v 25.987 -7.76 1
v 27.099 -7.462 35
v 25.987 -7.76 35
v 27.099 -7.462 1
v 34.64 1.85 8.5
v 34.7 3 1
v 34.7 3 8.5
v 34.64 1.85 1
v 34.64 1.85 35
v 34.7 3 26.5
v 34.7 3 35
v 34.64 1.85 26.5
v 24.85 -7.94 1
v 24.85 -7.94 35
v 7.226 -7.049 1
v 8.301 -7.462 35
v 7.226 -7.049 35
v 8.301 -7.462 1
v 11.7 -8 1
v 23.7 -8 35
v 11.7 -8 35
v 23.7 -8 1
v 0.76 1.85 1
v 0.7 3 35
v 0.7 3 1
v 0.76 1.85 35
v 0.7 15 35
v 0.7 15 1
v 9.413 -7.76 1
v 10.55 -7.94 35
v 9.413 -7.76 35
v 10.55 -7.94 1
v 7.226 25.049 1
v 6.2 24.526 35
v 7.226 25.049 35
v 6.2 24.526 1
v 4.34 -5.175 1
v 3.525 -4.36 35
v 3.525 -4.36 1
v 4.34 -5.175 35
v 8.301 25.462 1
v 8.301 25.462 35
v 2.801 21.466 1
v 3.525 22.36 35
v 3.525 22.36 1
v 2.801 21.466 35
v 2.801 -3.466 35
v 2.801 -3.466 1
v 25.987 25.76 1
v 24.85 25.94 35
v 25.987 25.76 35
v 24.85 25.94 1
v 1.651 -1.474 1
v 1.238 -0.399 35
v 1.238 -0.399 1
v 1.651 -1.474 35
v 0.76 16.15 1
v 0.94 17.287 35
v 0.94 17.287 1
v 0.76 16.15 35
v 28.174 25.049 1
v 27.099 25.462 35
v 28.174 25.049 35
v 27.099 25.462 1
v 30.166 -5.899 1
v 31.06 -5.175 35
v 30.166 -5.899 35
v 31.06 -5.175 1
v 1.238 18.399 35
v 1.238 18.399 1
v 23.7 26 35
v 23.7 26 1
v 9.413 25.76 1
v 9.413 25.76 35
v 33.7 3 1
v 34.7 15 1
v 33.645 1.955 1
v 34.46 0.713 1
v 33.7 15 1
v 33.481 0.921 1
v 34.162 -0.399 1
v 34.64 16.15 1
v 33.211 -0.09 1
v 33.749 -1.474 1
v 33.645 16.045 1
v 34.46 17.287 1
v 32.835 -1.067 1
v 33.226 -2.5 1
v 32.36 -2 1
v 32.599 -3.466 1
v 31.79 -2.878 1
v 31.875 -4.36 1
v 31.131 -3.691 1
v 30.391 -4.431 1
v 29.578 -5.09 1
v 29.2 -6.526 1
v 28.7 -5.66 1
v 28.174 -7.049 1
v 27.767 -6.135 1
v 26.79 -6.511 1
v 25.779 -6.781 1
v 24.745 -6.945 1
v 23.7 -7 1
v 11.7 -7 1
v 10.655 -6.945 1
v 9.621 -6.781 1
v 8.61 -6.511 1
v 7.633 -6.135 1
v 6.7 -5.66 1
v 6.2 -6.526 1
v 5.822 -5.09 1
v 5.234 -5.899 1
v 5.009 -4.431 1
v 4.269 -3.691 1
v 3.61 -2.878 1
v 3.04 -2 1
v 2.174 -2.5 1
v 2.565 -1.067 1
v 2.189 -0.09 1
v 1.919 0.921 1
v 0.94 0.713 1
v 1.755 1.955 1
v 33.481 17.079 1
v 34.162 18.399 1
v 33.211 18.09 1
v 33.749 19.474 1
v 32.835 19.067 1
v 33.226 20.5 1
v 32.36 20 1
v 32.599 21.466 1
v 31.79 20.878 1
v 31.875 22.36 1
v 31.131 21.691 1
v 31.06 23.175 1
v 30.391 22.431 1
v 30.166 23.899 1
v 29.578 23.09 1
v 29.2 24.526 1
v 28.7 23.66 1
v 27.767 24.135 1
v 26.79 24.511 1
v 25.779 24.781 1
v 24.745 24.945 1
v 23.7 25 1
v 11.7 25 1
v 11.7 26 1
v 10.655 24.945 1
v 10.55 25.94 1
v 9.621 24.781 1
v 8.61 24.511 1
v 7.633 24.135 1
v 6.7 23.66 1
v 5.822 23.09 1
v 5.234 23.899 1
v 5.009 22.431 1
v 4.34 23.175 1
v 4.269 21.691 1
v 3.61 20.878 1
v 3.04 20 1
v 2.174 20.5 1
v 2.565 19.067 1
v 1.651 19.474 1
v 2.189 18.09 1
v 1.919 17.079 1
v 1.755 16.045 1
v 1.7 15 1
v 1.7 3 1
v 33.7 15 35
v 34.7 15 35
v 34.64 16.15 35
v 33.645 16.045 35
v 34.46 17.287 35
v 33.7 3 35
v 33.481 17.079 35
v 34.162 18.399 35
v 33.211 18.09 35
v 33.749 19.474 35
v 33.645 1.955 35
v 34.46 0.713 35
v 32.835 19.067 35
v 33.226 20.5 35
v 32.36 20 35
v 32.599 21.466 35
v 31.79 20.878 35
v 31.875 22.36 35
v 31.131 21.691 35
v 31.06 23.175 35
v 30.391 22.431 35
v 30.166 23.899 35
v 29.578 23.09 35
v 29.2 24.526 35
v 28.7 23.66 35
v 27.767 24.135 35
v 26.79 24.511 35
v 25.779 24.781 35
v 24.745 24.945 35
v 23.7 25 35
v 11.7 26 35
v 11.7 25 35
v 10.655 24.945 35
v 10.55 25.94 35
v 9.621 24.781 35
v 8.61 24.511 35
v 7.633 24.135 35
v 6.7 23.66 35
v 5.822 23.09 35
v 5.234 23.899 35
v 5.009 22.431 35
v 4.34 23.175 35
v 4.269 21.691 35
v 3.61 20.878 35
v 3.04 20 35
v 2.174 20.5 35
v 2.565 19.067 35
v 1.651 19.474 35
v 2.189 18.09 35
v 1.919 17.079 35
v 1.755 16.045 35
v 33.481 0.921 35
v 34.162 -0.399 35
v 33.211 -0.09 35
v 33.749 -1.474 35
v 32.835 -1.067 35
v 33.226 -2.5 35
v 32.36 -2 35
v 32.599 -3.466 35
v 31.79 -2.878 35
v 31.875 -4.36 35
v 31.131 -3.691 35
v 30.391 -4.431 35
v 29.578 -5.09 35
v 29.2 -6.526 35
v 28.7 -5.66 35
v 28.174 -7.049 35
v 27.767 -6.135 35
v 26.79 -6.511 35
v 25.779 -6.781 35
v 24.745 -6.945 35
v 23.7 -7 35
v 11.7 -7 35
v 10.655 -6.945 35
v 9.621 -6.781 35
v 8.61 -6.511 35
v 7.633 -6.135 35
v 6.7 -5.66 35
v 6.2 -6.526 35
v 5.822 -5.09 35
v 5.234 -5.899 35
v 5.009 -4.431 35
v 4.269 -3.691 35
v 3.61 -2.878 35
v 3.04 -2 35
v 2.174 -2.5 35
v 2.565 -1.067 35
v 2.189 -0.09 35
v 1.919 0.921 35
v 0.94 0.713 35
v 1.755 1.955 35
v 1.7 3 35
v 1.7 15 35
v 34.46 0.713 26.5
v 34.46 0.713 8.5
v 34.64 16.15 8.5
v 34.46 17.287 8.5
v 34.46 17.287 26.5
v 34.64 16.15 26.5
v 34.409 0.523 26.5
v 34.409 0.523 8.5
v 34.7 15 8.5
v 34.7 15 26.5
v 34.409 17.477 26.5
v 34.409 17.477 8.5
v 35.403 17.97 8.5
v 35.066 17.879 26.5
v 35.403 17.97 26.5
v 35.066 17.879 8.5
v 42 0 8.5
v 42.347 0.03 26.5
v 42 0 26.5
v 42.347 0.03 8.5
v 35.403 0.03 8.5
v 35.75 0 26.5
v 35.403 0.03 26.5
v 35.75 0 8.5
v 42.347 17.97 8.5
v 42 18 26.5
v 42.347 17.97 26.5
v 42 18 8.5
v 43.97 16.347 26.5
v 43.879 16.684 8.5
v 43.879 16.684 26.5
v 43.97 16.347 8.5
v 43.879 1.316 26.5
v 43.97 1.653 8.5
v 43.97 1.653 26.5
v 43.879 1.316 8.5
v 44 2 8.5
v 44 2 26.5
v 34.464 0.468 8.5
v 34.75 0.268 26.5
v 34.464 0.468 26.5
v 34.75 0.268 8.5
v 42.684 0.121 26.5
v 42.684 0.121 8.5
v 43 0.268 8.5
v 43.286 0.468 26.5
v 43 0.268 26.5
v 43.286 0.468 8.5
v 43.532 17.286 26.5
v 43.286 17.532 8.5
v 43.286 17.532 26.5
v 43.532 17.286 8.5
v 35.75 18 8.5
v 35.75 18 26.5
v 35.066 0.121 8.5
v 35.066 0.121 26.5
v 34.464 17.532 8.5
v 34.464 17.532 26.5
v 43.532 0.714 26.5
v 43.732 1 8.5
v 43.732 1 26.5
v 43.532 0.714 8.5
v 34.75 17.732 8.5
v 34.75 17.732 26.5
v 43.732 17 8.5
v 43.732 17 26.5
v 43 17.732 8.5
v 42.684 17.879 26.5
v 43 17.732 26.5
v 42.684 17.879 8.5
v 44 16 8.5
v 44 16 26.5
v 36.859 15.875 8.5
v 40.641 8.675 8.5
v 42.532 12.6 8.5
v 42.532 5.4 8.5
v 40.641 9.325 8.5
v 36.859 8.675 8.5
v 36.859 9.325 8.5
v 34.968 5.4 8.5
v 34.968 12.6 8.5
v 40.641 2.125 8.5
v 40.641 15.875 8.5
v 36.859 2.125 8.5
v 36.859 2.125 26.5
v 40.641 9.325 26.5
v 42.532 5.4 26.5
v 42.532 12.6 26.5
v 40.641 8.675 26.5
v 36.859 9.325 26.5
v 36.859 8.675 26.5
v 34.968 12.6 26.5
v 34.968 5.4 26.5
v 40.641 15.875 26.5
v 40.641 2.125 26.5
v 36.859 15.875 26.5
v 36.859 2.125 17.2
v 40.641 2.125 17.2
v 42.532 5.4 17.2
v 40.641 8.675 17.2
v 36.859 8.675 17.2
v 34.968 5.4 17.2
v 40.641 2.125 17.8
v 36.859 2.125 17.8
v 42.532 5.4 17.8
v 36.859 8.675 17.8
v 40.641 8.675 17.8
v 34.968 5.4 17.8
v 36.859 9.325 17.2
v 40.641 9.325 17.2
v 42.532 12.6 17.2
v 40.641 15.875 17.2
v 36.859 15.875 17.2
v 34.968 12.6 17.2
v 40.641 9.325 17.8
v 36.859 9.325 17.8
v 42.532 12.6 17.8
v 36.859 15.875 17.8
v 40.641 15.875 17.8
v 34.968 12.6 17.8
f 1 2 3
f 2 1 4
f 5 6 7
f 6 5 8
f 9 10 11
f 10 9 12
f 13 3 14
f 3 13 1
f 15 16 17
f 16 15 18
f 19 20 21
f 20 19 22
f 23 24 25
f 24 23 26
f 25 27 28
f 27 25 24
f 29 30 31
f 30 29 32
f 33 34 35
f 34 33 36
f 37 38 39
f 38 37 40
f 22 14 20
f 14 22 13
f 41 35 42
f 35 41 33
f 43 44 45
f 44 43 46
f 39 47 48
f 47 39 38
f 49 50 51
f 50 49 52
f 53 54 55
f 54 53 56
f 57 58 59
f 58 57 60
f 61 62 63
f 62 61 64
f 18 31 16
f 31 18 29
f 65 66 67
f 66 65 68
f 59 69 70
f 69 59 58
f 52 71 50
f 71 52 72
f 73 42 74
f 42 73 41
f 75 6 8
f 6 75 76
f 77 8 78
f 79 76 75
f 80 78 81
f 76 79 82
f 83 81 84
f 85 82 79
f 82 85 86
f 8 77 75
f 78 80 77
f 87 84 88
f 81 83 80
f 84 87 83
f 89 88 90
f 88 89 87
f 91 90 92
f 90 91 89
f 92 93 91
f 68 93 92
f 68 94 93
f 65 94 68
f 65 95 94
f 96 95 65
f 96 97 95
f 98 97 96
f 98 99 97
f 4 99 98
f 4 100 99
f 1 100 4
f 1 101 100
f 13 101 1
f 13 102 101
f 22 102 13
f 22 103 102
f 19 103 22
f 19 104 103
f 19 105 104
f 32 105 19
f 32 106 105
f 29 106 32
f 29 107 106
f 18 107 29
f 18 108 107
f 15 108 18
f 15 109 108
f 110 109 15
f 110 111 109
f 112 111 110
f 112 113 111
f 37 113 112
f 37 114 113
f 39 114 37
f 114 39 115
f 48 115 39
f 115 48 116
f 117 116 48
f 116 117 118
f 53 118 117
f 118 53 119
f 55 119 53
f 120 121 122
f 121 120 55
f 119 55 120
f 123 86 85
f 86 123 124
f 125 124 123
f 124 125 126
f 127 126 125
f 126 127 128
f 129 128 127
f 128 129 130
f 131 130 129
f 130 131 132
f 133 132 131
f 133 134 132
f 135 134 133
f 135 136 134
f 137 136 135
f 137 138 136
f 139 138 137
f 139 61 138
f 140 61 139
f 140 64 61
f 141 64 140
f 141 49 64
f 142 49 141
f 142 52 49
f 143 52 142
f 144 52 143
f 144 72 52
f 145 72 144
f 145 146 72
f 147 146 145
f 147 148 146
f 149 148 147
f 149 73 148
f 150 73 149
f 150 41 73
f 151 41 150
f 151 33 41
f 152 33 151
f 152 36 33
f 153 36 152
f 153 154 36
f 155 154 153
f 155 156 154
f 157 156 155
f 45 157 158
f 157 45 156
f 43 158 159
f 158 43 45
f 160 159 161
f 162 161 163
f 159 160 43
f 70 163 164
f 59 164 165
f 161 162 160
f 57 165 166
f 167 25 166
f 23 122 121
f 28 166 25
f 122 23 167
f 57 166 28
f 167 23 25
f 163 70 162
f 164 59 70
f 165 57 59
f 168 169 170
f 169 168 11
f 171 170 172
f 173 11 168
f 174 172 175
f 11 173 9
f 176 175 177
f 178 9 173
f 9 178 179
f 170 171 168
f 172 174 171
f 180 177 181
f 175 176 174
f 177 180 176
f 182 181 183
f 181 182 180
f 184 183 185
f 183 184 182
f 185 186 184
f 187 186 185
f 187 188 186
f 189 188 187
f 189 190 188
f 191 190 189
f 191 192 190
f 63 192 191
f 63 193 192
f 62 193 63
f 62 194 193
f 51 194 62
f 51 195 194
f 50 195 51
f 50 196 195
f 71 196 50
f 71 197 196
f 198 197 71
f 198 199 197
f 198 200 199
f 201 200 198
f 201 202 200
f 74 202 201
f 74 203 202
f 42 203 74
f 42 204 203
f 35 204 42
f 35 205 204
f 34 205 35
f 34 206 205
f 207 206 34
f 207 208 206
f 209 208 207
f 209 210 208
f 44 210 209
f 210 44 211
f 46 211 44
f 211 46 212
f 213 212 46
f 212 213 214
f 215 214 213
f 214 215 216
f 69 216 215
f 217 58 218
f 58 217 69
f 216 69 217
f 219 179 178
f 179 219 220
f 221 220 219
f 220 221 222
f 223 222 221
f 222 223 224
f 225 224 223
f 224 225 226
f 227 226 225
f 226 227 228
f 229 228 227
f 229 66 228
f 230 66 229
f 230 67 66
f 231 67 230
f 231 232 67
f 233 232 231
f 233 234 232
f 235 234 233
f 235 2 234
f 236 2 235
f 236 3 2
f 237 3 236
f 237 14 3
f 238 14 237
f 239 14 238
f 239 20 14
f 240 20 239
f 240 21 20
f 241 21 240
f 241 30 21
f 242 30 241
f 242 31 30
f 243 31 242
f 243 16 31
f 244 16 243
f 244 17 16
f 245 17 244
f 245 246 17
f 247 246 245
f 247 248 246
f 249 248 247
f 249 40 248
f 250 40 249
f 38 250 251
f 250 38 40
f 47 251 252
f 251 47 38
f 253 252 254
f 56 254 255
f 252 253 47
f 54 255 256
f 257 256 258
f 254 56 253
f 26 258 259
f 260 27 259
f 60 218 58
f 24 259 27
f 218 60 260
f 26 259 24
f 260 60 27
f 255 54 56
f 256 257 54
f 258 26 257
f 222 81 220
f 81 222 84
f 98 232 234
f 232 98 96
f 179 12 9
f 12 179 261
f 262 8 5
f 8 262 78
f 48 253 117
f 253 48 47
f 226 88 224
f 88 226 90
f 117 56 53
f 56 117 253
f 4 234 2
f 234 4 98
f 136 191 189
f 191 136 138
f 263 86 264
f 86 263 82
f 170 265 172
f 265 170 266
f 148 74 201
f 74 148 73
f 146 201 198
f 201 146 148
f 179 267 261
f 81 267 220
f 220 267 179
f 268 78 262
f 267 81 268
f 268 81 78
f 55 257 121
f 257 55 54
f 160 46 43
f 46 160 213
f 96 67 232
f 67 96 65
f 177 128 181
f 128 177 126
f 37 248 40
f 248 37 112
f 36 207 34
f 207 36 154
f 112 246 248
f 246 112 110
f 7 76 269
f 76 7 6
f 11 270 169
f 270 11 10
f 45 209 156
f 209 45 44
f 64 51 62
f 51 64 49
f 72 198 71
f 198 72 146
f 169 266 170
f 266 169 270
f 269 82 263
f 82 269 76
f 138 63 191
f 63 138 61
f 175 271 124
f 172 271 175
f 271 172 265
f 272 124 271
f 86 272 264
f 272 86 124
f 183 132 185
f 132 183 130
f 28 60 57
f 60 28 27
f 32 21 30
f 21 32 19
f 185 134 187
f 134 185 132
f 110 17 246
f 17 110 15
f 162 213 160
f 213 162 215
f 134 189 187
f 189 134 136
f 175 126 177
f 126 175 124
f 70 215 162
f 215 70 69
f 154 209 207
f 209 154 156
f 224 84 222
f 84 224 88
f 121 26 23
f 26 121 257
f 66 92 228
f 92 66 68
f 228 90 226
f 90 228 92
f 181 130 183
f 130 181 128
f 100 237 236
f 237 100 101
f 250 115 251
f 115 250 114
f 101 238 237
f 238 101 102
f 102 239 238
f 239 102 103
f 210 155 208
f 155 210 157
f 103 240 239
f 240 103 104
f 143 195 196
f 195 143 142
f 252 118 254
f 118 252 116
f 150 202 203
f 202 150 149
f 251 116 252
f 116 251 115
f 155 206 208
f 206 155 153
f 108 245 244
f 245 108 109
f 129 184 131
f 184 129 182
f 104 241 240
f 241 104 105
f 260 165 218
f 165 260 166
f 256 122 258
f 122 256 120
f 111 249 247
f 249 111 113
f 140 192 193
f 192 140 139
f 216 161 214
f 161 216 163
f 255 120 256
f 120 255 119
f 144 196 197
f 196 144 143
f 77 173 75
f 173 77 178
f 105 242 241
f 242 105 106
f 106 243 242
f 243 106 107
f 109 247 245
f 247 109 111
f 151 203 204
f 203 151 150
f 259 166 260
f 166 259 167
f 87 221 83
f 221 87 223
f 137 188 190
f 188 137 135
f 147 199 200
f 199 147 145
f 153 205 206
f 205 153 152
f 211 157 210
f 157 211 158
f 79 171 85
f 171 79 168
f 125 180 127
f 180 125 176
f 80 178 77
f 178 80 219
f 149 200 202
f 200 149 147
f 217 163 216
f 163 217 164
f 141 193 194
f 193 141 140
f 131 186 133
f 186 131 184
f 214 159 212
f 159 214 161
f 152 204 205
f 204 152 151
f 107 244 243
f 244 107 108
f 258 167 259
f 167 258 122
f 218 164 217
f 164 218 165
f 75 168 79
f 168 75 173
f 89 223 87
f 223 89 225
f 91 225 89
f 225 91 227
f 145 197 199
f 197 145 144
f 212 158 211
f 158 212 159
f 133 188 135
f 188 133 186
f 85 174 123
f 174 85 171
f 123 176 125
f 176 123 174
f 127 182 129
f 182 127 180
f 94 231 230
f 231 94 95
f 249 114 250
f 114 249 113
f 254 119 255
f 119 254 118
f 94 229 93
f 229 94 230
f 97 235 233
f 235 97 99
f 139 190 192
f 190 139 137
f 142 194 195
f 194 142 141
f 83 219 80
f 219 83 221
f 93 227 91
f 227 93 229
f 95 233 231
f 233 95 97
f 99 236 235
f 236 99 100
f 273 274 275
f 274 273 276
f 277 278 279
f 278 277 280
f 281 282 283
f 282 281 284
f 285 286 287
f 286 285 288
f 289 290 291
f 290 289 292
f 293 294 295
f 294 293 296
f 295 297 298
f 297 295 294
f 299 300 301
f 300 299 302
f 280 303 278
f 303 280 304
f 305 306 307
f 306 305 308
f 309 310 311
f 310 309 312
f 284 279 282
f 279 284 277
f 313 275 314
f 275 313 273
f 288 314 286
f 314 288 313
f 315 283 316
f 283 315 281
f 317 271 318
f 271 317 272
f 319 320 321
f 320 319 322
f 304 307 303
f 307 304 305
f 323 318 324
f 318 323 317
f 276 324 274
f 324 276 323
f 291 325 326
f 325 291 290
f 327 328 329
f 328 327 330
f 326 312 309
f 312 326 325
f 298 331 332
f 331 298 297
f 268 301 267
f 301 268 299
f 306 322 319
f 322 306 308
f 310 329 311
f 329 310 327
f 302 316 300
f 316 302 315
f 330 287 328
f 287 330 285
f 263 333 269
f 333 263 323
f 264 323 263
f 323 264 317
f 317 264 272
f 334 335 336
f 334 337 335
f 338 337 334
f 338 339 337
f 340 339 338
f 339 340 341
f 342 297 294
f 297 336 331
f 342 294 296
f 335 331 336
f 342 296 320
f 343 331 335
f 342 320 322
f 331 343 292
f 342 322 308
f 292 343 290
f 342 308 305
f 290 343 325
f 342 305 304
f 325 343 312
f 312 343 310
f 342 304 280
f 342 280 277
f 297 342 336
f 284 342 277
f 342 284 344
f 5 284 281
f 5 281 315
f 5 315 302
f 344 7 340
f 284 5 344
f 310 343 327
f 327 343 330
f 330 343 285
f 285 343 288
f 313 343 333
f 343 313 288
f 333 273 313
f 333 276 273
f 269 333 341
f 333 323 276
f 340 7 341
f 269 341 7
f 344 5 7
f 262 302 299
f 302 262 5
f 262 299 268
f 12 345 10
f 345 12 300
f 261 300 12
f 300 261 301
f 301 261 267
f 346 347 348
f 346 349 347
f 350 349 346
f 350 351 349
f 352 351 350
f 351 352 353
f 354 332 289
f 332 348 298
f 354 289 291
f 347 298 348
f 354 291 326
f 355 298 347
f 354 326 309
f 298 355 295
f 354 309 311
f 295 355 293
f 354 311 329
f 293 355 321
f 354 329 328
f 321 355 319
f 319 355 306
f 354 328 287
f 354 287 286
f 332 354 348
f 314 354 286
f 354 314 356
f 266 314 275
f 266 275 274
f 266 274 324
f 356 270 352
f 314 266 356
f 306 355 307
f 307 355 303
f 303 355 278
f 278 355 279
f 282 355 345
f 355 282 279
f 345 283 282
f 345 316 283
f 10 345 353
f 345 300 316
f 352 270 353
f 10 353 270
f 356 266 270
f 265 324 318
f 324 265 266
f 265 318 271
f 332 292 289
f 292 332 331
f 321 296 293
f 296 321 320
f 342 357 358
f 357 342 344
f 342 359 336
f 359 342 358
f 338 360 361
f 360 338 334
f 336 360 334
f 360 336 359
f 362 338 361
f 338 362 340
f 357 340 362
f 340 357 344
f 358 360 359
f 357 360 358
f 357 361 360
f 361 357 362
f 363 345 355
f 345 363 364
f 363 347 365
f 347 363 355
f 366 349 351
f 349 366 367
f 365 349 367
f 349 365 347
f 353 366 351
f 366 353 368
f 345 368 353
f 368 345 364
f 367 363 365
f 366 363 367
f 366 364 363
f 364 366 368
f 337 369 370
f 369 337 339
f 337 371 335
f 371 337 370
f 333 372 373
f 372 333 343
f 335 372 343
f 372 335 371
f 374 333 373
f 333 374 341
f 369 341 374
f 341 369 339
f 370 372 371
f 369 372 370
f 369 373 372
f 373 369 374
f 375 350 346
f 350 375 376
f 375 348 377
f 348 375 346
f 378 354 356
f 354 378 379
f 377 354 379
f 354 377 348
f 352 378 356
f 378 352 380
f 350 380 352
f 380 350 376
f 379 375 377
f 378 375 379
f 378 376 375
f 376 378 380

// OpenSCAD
// OpenSCAD: держатель отвёртки — скорлупа со скруглённым прямоугольным пазом и боковым крепёжным блоком
// Версия: v1.0 — начальная геометрия по заданным размерам

description = "Rounded-rect shell (34 mm inner, r5), 1 mm wall, open bottom, side 17³ holder and two hex holes";
version_str = "1.0";

use <../modules.scad>;

// ===== Точность аппроксимации окружностей =====
$fn = 0;
$fa = 6;
$fs = 0.35;
pin_fs = 0.25;

// ===== Режим печати тест‑фрагментов =====
test_fragment = false;
frag_size = 20;
frag_index = 0;
frag_gap_x = 10;
frag_h_extra = 20;

// ===== Общие доп. параметры =====
tiny = 0.1;
edge_chamfer_z = 1;
edge_chamfer_x = 5;
edge_chamfer_y = 5;
screen_frame_gap = 0.2;

// ===== Комментарии ===========================
/*
Модель: одна деталь для печати — «стакан» под рукоятку и блок крепления на внешней стенке.
Ось Z вверх, дно стакана на Z=0.

Фрагменты (имена с _):
- shell_wall — внешняя скорлупа без дна: внутри скруглённый прямоугольник 34×34, r=5 мм, высота 35 мм
- holder_block — скруглённый блок, центрирован на выбранной внешней стенке
- holder_hex_cut — два вертикальных шестигранных отверстия (параллельные грани 6 мм), по горизонтали

Деталь для вывода: base = union(shell_wall, holder_block) − holder_hex_cut
*/

// ===== Параметры модели =====
// --- shell (скорлупа) ---
shell_h = 35;
inner_flat_x = 32;
inner_flat_y = 32;
inner_corner_r = 10;
wall_th = 1;
shell_bottom_th = 0;

// --- holder (блок на стенке) ---
holder_depth_x = 10;
holder_width_y = 18;
holder_height_z = 18;
holder_corner_r = 2; // скругление углов блока в плане XY
holder_shift_x = -0.7; // сдвиг holder по оси X, мм
holder_center_wall_z = 0.8; // перегородка по центру holder вдоль XY, мм
holder_face = "x_plus"; // x_plus | x_minus | y_plus | y_minus — внешняя стенка, к которой крепится блок
holder_overlap_shell = 0.25;

// шестигранник: расстояние между параллельными гранями (across flats), мм
hex_flat_to_flat = 6.35;
hex_depth_clearance = 0.2;

// ===== Вычисляемые размеры =====
outer_flat_x = inner_flat_x + 2 * wall_th;
outer_flat_y = inner_flat_y + 2 * wall_th;
outer_corner_r = inner_corner_r + wall_th;

base_h = shell_h;

function holder_min_x() =
  (
    (holder_face == "x_minus") ? (-holder_depth_x + holder_overlap_shell) :
    (holder_face == "y_plus" || holder_face == "y_minus") ? ((outer_flat_x - holder_width_y) / 2) :
    0
  ) + holder_shift_x;

function holder_max_x() =
  (
    (holder_face == "x_plus") ? (outer_flat_x + holder_depth_x) :
    outer_flat_x
  ) + holder_shift_x;

function holder_min_y() =
  (holder_face == "y_minus") ? (-holder_depth_x + holder_overlap_shell) :
  (holder_face == "x_plus" || holder_face == "x_minus") ? ((outer_flat_y - holder_width_y) / 2) :
  0;

function holder_max_y() =
  (holder_face == "y_plus") ? (outer_flat_y + holder_depth_x) :
  outer_flat_y;

footprint_l = holder_max_x() - holder_min_x();
footprint_w = holder_max_y() - holder_min_y();

function hex_circumradius_from_flat(ftf) = (ftf + hex_depth_clearance) / sqrt(3);

function clamp(val, lo, hi) = max(lo, min(val, hi));

// ===== Вспомогательные модули ====================
module hex_prism_vertical(h, ftf) {
  r = hex_circumradius_from_flat(ftf);
  translate([0, 0, -tiny])
    cylinder(h = h + 2 * tiny, r = r, $fn = 6, $fs = pin_fs, $fa = 6);
}

// Позиция блока: минимальный угол касания внешней грани — (hx, hy, hz)
function holder_origin() =
  (holder_face == "x_plus")
    ? [outer_flat_x - holder_overlap_shell + holder_shift_x, (outer_flat_y - holder_width_y) / 2, (shell_h - holder_height_z) / 2]
  : (holder_face == "x_minus")
    ? [-holder_depth_x + holder_overlap_shell + holder_shift_x, (outer_flat_y - holder_width_y) / 2, (shell_h - holder_height_z) / 2]
  : (holder_face == "y_plus")
    ? [(outer_flat_x - holder_width_y) / 2 + holder_shift_x, outer_flat_y - holder_overlap_shell, (shell_h - holder_height_z) / 2]
    : [(outer_flat_x - holder_width_y) / 2 + holder_shift_x, -holder_depth_x + holder_overlap_shell, (shell_h - holder_height_z) / 2];

// Локальные координаты отверстий в плане блока (ось отверстия Z): [u, v] в системе «глубина × ширина» блока
holder_hole_uv = [
  [holder_depth_x / 2, holder_width_y * 0.30],
  [holder_depth_x / 2, holder_width_y * 0.70],
];

// ===== Модули фрагментов детали ====================
module shell_wall() {
  difference() {
    rounded_rect_extrude_bottom_chamfer(
      size = [outer_flat_x, outer_flat_y],
      r = outer_corner_r,
      h = shell_h,
      chz = edge_chamfer_z,
      chx = edge_chamfer_x,
      chy = edge_chamfer_y
    );
    translate([wall_th, wall_th, -tiny])
      rr_extrude(
        size = [inner_flat_x, inner_flat_y],
        r = max(inner_corner_r, 0),
        h = shell_h + 2 * tiny
      );
  }
}

module holder_block() {
  o = holder_origin();
  sx = (holder_face == "x_plus" || holder_face == "x_minus")
    ? (holder_depth_x + holder_overlap_shell)
    : holder_width_y;
  sy = (holder_face == "x_plus" || holder_face == "x_minus")
    ? holder_width_y
    : (holder_depth_x + holder_overlap_shell);
  r = clamp(holder_corner_r, 0, min(sx, sy) / 2 - tiny);

  if (holder_face == "x_plus" || holder_face == "x_minus") {
    translate(o)
      rr_extrude(size = [sx, sy], r = r, h = holder_height_z);
  } else {
    translate(o)
      rr_extrude(size = [sx, sy], r = r, h = holder_height_z);
  }
}

module holder_hex_cut() {
  o = holder_origin();
  hz = o[2];
  split_z = clamp(holder_center_wall_z, 0, holder_height_z - 2 * tiny);
  seg_h = (holder_height_z - split_z) / 2;
  z_bottom = 0;
  z_top = seg_h + split_z;
  if (holder_face == "x_plus" || holder_face == "x_minus") {
    for (p = holder_hole_uv) {
      translate([o[0], o[1], hz])
        translate([p[0], p[1], 0])
          union() {
            translate([0, 0, z_bottom])
              hex_prism_vertical(seg_h, hex_flat_to_flat);
            translate([0, 0, z_top])
              hex_prism_vertical(seg_h, hex_flat_to_flat);
          }
    }
  } else {
    for (p = holder_hole_uv) {
      translate([o[0], o[1], hz])
        translate([p[1], p[0], 0])
          union() {
            translate([0, 0, z_bottom])
              hex_prism_vertical(seg_h, hex_flat_to_flat);
            translate([0, 0, z_top])
              hex_prism_vertical(seg_h, hex_flat_to_flat);
          }
    }
  }
}

// ===== Сборка основной детали ====================
module base() {
  difference() {
    union() {
      shell_wall();
      holder_block();
    }
    holder_hex_cut();
  }
}

// ===== Вывод всех фрагментов ====================
module show_all() {
  clip_for_fragments_bbox(
    footprint_l,
    footprint_w,
    base_h,
    test_fragment,
    frag_size,
    frag_index,
    frag_h_extra
  ) {
    translate([-holder_min_x(), -holder_min_y(), 0])
      base();
  }
}

// ===== Точка входа ====================
module main() {
  show_all();
}

main();
